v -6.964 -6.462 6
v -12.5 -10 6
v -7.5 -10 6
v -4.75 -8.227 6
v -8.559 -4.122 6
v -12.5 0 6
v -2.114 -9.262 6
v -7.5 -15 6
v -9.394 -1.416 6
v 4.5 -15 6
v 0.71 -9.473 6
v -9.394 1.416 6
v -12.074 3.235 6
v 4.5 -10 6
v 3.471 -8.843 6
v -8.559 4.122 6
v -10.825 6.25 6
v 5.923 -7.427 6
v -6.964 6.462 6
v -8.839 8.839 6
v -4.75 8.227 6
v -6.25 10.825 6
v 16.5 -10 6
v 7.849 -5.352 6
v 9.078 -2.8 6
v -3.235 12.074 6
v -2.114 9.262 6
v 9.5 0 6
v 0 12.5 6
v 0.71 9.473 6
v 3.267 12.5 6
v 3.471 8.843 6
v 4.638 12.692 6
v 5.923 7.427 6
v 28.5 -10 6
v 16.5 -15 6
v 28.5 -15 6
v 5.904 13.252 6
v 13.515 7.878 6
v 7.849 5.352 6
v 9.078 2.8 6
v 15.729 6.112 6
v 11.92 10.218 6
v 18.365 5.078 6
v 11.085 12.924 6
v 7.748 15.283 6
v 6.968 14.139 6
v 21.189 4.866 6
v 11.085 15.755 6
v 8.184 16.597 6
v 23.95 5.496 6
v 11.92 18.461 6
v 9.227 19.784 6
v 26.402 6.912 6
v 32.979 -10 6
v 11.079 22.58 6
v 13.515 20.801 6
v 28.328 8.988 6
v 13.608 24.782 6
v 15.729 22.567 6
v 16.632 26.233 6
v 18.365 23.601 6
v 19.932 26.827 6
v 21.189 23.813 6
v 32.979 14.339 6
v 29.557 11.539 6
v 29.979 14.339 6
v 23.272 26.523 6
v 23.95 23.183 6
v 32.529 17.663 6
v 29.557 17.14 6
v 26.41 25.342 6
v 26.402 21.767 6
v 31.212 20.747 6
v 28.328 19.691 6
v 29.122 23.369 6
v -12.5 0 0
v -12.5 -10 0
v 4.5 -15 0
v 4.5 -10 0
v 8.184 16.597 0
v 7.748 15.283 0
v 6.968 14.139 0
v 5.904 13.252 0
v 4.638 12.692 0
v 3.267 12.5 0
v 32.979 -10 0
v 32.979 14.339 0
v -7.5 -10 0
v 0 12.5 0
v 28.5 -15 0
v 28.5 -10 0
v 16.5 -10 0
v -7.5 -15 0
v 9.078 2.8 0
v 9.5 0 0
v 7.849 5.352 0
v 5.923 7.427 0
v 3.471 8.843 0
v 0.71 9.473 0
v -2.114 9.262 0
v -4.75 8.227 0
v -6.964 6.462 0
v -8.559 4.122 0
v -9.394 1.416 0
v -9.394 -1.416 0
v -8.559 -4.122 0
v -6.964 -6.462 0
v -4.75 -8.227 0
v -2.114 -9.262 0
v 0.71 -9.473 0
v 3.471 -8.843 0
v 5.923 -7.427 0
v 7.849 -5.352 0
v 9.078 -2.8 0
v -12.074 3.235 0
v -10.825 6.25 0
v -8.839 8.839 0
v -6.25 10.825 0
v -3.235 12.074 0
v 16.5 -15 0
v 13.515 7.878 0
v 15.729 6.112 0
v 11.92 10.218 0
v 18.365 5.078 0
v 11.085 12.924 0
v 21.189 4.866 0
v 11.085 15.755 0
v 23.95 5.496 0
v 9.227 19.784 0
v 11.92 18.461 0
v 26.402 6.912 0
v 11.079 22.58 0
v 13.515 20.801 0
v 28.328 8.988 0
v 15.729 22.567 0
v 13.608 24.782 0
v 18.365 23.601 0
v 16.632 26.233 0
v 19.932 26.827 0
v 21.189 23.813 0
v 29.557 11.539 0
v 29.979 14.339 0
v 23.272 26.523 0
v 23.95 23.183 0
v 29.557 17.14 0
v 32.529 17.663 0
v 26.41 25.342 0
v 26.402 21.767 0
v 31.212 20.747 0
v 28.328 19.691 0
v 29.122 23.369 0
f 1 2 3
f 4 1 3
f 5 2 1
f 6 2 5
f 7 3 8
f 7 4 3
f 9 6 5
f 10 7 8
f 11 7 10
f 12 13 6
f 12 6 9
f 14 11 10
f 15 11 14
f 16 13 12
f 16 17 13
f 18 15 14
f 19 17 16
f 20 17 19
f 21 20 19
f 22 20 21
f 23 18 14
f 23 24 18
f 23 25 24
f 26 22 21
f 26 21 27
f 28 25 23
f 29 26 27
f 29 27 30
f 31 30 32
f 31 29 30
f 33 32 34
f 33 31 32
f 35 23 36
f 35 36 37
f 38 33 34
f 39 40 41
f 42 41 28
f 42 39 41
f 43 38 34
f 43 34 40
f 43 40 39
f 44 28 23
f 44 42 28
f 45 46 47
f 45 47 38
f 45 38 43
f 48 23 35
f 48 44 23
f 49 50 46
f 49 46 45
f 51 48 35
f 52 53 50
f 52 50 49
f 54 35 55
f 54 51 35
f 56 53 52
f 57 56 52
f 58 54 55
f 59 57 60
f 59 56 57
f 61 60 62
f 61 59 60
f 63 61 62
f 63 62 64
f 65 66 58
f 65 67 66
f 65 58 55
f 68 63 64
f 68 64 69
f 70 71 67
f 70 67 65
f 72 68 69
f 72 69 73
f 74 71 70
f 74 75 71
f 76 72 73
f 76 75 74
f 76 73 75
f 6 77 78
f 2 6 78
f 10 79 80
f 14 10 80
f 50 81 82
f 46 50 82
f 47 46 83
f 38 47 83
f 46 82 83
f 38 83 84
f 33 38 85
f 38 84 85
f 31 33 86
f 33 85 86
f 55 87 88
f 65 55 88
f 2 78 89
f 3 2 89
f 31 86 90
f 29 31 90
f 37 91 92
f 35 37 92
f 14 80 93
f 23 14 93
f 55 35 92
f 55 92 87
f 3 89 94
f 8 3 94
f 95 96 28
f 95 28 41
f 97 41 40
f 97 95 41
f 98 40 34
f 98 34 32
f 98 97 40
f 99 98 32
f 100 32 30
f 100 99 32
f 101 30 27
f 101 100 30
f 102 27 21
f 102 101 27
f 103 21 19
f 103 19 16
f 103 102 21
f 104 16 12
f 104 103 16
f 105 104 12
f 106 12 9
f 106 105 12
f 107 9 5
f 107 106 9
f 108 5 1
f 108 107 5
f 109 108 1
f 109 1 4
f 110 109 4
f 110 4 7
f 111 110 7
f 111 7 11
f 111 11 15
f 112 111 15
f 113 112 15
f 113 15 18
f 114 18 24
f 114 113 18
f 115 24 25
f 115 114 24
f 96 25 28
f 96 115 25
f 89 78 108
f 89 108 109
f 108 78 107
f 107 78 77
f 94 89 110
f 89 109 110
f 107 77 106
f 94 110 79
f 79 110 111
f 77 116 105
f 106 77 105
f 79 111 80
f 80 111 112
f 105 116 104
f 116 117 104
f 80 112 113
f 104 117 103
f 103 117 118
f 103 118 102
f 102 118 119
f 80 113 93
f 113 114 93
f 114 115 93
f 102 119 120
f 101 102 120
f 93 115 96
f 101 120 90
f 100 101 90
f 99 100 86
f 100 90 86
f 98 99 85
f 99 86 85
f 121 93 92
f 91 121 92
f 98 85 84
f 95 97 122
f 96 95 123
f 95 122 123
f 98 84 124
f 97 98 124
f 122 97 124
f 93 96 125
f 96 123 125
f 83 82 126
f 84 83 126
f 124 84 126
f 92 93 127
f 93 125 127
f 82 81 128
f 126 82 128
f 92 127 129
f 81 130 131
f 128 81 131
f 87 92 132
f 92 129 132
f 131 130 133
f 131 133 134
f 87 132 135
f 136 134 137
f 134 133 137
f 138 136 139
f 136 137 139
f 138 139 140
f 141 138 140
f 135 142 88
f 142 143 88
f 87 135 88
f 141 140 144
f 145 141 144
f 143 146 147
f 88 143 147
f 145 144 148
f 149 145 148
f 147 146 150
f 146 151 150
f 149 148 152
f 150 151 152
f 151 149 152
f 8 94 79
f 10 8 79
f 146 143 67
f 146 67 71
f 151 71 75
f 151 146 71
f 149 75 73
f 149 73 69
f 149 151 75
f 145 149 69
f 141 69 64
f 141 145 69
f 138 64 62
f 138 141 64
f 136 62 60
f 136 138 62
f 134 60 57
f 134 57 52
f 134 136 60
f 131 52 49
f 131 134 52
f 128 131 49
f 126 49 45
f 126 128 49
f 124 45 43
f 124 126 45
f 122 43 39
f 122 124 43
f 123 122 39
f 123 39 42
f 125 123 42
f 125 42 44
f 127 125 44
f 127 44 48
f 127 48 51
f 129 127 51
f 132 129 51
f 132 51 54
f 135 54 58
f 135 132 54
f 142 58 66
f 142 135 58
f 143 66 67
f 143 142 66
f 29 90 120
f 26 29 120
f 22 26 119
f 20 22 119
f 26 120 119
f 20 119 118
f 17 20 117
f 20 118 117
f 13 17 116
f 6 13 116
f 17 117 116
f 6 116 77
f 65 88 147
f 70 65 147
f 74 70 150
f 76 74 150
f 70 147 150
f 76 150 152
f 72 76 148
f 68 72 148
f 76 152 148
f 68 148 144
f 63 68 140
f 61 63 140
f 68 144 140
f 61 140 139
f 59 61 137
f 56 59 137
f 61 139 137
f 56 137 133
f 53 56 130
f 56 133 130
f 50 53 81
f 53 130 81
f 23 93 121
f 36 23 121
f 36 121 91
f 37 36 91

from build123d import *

# Parameters (mm, degrees)
CROQUIS1_R              = 9.5
SALIENTE_EXTRUIR1_DEPTH = 6


with BuildPart() as part:
    # Croquis1 → Saliente-Extruir1 (new body)
    with BuildSketch(Plane.XY):
        with BuildLine():
            Line((-12.5, 0), (-12.5, -10))
            Line((-12.5, -10), (-7.5, -10))
            Line((-7.5, -10), (-7.5, -15))
            Line((-7.5, -15), (4.5, -15))
            Line((4.5, -15), (4.5, -10))
            Line((4.5, -10), (16.5, -10))
            Line((16.5, -10), (16.5, -15))
            Line((16.5, -15), (28.5, -15))
            Line((28.5, -15), (28.5, -10))
            Line((28.5, -10), (32.978801107, -10))
            Line((32.978801107, -10), (32.978801107, 14.339410909))
            ThreePointArc((32.978801107, 14.339410909), (21.612252248, 26.787916382), (8.184354945, 16.596974545))
            ThreePointArc((8.184354945, 16.596974545), (6.46695714, 13.658442551), (3.266576481, 12.5))
            Line((3.266576481, 12.5), (0, 12.5))
            ThreePointArc((0, 12.5), (-8.838834765, 8.838834765), (-12.5, 0))
        make_face()
        Circle(CROQUIS1_R, mode=Mode.SUBTRACT)
        with Locations((20.478801107, 14.339410909)):
            Circle(CROQUIS1_R, mode=Mode.SUBTRACT)
    extrude(amount=SALIENTE_EXTRUIR1_DEPTH)


solid = part.part
